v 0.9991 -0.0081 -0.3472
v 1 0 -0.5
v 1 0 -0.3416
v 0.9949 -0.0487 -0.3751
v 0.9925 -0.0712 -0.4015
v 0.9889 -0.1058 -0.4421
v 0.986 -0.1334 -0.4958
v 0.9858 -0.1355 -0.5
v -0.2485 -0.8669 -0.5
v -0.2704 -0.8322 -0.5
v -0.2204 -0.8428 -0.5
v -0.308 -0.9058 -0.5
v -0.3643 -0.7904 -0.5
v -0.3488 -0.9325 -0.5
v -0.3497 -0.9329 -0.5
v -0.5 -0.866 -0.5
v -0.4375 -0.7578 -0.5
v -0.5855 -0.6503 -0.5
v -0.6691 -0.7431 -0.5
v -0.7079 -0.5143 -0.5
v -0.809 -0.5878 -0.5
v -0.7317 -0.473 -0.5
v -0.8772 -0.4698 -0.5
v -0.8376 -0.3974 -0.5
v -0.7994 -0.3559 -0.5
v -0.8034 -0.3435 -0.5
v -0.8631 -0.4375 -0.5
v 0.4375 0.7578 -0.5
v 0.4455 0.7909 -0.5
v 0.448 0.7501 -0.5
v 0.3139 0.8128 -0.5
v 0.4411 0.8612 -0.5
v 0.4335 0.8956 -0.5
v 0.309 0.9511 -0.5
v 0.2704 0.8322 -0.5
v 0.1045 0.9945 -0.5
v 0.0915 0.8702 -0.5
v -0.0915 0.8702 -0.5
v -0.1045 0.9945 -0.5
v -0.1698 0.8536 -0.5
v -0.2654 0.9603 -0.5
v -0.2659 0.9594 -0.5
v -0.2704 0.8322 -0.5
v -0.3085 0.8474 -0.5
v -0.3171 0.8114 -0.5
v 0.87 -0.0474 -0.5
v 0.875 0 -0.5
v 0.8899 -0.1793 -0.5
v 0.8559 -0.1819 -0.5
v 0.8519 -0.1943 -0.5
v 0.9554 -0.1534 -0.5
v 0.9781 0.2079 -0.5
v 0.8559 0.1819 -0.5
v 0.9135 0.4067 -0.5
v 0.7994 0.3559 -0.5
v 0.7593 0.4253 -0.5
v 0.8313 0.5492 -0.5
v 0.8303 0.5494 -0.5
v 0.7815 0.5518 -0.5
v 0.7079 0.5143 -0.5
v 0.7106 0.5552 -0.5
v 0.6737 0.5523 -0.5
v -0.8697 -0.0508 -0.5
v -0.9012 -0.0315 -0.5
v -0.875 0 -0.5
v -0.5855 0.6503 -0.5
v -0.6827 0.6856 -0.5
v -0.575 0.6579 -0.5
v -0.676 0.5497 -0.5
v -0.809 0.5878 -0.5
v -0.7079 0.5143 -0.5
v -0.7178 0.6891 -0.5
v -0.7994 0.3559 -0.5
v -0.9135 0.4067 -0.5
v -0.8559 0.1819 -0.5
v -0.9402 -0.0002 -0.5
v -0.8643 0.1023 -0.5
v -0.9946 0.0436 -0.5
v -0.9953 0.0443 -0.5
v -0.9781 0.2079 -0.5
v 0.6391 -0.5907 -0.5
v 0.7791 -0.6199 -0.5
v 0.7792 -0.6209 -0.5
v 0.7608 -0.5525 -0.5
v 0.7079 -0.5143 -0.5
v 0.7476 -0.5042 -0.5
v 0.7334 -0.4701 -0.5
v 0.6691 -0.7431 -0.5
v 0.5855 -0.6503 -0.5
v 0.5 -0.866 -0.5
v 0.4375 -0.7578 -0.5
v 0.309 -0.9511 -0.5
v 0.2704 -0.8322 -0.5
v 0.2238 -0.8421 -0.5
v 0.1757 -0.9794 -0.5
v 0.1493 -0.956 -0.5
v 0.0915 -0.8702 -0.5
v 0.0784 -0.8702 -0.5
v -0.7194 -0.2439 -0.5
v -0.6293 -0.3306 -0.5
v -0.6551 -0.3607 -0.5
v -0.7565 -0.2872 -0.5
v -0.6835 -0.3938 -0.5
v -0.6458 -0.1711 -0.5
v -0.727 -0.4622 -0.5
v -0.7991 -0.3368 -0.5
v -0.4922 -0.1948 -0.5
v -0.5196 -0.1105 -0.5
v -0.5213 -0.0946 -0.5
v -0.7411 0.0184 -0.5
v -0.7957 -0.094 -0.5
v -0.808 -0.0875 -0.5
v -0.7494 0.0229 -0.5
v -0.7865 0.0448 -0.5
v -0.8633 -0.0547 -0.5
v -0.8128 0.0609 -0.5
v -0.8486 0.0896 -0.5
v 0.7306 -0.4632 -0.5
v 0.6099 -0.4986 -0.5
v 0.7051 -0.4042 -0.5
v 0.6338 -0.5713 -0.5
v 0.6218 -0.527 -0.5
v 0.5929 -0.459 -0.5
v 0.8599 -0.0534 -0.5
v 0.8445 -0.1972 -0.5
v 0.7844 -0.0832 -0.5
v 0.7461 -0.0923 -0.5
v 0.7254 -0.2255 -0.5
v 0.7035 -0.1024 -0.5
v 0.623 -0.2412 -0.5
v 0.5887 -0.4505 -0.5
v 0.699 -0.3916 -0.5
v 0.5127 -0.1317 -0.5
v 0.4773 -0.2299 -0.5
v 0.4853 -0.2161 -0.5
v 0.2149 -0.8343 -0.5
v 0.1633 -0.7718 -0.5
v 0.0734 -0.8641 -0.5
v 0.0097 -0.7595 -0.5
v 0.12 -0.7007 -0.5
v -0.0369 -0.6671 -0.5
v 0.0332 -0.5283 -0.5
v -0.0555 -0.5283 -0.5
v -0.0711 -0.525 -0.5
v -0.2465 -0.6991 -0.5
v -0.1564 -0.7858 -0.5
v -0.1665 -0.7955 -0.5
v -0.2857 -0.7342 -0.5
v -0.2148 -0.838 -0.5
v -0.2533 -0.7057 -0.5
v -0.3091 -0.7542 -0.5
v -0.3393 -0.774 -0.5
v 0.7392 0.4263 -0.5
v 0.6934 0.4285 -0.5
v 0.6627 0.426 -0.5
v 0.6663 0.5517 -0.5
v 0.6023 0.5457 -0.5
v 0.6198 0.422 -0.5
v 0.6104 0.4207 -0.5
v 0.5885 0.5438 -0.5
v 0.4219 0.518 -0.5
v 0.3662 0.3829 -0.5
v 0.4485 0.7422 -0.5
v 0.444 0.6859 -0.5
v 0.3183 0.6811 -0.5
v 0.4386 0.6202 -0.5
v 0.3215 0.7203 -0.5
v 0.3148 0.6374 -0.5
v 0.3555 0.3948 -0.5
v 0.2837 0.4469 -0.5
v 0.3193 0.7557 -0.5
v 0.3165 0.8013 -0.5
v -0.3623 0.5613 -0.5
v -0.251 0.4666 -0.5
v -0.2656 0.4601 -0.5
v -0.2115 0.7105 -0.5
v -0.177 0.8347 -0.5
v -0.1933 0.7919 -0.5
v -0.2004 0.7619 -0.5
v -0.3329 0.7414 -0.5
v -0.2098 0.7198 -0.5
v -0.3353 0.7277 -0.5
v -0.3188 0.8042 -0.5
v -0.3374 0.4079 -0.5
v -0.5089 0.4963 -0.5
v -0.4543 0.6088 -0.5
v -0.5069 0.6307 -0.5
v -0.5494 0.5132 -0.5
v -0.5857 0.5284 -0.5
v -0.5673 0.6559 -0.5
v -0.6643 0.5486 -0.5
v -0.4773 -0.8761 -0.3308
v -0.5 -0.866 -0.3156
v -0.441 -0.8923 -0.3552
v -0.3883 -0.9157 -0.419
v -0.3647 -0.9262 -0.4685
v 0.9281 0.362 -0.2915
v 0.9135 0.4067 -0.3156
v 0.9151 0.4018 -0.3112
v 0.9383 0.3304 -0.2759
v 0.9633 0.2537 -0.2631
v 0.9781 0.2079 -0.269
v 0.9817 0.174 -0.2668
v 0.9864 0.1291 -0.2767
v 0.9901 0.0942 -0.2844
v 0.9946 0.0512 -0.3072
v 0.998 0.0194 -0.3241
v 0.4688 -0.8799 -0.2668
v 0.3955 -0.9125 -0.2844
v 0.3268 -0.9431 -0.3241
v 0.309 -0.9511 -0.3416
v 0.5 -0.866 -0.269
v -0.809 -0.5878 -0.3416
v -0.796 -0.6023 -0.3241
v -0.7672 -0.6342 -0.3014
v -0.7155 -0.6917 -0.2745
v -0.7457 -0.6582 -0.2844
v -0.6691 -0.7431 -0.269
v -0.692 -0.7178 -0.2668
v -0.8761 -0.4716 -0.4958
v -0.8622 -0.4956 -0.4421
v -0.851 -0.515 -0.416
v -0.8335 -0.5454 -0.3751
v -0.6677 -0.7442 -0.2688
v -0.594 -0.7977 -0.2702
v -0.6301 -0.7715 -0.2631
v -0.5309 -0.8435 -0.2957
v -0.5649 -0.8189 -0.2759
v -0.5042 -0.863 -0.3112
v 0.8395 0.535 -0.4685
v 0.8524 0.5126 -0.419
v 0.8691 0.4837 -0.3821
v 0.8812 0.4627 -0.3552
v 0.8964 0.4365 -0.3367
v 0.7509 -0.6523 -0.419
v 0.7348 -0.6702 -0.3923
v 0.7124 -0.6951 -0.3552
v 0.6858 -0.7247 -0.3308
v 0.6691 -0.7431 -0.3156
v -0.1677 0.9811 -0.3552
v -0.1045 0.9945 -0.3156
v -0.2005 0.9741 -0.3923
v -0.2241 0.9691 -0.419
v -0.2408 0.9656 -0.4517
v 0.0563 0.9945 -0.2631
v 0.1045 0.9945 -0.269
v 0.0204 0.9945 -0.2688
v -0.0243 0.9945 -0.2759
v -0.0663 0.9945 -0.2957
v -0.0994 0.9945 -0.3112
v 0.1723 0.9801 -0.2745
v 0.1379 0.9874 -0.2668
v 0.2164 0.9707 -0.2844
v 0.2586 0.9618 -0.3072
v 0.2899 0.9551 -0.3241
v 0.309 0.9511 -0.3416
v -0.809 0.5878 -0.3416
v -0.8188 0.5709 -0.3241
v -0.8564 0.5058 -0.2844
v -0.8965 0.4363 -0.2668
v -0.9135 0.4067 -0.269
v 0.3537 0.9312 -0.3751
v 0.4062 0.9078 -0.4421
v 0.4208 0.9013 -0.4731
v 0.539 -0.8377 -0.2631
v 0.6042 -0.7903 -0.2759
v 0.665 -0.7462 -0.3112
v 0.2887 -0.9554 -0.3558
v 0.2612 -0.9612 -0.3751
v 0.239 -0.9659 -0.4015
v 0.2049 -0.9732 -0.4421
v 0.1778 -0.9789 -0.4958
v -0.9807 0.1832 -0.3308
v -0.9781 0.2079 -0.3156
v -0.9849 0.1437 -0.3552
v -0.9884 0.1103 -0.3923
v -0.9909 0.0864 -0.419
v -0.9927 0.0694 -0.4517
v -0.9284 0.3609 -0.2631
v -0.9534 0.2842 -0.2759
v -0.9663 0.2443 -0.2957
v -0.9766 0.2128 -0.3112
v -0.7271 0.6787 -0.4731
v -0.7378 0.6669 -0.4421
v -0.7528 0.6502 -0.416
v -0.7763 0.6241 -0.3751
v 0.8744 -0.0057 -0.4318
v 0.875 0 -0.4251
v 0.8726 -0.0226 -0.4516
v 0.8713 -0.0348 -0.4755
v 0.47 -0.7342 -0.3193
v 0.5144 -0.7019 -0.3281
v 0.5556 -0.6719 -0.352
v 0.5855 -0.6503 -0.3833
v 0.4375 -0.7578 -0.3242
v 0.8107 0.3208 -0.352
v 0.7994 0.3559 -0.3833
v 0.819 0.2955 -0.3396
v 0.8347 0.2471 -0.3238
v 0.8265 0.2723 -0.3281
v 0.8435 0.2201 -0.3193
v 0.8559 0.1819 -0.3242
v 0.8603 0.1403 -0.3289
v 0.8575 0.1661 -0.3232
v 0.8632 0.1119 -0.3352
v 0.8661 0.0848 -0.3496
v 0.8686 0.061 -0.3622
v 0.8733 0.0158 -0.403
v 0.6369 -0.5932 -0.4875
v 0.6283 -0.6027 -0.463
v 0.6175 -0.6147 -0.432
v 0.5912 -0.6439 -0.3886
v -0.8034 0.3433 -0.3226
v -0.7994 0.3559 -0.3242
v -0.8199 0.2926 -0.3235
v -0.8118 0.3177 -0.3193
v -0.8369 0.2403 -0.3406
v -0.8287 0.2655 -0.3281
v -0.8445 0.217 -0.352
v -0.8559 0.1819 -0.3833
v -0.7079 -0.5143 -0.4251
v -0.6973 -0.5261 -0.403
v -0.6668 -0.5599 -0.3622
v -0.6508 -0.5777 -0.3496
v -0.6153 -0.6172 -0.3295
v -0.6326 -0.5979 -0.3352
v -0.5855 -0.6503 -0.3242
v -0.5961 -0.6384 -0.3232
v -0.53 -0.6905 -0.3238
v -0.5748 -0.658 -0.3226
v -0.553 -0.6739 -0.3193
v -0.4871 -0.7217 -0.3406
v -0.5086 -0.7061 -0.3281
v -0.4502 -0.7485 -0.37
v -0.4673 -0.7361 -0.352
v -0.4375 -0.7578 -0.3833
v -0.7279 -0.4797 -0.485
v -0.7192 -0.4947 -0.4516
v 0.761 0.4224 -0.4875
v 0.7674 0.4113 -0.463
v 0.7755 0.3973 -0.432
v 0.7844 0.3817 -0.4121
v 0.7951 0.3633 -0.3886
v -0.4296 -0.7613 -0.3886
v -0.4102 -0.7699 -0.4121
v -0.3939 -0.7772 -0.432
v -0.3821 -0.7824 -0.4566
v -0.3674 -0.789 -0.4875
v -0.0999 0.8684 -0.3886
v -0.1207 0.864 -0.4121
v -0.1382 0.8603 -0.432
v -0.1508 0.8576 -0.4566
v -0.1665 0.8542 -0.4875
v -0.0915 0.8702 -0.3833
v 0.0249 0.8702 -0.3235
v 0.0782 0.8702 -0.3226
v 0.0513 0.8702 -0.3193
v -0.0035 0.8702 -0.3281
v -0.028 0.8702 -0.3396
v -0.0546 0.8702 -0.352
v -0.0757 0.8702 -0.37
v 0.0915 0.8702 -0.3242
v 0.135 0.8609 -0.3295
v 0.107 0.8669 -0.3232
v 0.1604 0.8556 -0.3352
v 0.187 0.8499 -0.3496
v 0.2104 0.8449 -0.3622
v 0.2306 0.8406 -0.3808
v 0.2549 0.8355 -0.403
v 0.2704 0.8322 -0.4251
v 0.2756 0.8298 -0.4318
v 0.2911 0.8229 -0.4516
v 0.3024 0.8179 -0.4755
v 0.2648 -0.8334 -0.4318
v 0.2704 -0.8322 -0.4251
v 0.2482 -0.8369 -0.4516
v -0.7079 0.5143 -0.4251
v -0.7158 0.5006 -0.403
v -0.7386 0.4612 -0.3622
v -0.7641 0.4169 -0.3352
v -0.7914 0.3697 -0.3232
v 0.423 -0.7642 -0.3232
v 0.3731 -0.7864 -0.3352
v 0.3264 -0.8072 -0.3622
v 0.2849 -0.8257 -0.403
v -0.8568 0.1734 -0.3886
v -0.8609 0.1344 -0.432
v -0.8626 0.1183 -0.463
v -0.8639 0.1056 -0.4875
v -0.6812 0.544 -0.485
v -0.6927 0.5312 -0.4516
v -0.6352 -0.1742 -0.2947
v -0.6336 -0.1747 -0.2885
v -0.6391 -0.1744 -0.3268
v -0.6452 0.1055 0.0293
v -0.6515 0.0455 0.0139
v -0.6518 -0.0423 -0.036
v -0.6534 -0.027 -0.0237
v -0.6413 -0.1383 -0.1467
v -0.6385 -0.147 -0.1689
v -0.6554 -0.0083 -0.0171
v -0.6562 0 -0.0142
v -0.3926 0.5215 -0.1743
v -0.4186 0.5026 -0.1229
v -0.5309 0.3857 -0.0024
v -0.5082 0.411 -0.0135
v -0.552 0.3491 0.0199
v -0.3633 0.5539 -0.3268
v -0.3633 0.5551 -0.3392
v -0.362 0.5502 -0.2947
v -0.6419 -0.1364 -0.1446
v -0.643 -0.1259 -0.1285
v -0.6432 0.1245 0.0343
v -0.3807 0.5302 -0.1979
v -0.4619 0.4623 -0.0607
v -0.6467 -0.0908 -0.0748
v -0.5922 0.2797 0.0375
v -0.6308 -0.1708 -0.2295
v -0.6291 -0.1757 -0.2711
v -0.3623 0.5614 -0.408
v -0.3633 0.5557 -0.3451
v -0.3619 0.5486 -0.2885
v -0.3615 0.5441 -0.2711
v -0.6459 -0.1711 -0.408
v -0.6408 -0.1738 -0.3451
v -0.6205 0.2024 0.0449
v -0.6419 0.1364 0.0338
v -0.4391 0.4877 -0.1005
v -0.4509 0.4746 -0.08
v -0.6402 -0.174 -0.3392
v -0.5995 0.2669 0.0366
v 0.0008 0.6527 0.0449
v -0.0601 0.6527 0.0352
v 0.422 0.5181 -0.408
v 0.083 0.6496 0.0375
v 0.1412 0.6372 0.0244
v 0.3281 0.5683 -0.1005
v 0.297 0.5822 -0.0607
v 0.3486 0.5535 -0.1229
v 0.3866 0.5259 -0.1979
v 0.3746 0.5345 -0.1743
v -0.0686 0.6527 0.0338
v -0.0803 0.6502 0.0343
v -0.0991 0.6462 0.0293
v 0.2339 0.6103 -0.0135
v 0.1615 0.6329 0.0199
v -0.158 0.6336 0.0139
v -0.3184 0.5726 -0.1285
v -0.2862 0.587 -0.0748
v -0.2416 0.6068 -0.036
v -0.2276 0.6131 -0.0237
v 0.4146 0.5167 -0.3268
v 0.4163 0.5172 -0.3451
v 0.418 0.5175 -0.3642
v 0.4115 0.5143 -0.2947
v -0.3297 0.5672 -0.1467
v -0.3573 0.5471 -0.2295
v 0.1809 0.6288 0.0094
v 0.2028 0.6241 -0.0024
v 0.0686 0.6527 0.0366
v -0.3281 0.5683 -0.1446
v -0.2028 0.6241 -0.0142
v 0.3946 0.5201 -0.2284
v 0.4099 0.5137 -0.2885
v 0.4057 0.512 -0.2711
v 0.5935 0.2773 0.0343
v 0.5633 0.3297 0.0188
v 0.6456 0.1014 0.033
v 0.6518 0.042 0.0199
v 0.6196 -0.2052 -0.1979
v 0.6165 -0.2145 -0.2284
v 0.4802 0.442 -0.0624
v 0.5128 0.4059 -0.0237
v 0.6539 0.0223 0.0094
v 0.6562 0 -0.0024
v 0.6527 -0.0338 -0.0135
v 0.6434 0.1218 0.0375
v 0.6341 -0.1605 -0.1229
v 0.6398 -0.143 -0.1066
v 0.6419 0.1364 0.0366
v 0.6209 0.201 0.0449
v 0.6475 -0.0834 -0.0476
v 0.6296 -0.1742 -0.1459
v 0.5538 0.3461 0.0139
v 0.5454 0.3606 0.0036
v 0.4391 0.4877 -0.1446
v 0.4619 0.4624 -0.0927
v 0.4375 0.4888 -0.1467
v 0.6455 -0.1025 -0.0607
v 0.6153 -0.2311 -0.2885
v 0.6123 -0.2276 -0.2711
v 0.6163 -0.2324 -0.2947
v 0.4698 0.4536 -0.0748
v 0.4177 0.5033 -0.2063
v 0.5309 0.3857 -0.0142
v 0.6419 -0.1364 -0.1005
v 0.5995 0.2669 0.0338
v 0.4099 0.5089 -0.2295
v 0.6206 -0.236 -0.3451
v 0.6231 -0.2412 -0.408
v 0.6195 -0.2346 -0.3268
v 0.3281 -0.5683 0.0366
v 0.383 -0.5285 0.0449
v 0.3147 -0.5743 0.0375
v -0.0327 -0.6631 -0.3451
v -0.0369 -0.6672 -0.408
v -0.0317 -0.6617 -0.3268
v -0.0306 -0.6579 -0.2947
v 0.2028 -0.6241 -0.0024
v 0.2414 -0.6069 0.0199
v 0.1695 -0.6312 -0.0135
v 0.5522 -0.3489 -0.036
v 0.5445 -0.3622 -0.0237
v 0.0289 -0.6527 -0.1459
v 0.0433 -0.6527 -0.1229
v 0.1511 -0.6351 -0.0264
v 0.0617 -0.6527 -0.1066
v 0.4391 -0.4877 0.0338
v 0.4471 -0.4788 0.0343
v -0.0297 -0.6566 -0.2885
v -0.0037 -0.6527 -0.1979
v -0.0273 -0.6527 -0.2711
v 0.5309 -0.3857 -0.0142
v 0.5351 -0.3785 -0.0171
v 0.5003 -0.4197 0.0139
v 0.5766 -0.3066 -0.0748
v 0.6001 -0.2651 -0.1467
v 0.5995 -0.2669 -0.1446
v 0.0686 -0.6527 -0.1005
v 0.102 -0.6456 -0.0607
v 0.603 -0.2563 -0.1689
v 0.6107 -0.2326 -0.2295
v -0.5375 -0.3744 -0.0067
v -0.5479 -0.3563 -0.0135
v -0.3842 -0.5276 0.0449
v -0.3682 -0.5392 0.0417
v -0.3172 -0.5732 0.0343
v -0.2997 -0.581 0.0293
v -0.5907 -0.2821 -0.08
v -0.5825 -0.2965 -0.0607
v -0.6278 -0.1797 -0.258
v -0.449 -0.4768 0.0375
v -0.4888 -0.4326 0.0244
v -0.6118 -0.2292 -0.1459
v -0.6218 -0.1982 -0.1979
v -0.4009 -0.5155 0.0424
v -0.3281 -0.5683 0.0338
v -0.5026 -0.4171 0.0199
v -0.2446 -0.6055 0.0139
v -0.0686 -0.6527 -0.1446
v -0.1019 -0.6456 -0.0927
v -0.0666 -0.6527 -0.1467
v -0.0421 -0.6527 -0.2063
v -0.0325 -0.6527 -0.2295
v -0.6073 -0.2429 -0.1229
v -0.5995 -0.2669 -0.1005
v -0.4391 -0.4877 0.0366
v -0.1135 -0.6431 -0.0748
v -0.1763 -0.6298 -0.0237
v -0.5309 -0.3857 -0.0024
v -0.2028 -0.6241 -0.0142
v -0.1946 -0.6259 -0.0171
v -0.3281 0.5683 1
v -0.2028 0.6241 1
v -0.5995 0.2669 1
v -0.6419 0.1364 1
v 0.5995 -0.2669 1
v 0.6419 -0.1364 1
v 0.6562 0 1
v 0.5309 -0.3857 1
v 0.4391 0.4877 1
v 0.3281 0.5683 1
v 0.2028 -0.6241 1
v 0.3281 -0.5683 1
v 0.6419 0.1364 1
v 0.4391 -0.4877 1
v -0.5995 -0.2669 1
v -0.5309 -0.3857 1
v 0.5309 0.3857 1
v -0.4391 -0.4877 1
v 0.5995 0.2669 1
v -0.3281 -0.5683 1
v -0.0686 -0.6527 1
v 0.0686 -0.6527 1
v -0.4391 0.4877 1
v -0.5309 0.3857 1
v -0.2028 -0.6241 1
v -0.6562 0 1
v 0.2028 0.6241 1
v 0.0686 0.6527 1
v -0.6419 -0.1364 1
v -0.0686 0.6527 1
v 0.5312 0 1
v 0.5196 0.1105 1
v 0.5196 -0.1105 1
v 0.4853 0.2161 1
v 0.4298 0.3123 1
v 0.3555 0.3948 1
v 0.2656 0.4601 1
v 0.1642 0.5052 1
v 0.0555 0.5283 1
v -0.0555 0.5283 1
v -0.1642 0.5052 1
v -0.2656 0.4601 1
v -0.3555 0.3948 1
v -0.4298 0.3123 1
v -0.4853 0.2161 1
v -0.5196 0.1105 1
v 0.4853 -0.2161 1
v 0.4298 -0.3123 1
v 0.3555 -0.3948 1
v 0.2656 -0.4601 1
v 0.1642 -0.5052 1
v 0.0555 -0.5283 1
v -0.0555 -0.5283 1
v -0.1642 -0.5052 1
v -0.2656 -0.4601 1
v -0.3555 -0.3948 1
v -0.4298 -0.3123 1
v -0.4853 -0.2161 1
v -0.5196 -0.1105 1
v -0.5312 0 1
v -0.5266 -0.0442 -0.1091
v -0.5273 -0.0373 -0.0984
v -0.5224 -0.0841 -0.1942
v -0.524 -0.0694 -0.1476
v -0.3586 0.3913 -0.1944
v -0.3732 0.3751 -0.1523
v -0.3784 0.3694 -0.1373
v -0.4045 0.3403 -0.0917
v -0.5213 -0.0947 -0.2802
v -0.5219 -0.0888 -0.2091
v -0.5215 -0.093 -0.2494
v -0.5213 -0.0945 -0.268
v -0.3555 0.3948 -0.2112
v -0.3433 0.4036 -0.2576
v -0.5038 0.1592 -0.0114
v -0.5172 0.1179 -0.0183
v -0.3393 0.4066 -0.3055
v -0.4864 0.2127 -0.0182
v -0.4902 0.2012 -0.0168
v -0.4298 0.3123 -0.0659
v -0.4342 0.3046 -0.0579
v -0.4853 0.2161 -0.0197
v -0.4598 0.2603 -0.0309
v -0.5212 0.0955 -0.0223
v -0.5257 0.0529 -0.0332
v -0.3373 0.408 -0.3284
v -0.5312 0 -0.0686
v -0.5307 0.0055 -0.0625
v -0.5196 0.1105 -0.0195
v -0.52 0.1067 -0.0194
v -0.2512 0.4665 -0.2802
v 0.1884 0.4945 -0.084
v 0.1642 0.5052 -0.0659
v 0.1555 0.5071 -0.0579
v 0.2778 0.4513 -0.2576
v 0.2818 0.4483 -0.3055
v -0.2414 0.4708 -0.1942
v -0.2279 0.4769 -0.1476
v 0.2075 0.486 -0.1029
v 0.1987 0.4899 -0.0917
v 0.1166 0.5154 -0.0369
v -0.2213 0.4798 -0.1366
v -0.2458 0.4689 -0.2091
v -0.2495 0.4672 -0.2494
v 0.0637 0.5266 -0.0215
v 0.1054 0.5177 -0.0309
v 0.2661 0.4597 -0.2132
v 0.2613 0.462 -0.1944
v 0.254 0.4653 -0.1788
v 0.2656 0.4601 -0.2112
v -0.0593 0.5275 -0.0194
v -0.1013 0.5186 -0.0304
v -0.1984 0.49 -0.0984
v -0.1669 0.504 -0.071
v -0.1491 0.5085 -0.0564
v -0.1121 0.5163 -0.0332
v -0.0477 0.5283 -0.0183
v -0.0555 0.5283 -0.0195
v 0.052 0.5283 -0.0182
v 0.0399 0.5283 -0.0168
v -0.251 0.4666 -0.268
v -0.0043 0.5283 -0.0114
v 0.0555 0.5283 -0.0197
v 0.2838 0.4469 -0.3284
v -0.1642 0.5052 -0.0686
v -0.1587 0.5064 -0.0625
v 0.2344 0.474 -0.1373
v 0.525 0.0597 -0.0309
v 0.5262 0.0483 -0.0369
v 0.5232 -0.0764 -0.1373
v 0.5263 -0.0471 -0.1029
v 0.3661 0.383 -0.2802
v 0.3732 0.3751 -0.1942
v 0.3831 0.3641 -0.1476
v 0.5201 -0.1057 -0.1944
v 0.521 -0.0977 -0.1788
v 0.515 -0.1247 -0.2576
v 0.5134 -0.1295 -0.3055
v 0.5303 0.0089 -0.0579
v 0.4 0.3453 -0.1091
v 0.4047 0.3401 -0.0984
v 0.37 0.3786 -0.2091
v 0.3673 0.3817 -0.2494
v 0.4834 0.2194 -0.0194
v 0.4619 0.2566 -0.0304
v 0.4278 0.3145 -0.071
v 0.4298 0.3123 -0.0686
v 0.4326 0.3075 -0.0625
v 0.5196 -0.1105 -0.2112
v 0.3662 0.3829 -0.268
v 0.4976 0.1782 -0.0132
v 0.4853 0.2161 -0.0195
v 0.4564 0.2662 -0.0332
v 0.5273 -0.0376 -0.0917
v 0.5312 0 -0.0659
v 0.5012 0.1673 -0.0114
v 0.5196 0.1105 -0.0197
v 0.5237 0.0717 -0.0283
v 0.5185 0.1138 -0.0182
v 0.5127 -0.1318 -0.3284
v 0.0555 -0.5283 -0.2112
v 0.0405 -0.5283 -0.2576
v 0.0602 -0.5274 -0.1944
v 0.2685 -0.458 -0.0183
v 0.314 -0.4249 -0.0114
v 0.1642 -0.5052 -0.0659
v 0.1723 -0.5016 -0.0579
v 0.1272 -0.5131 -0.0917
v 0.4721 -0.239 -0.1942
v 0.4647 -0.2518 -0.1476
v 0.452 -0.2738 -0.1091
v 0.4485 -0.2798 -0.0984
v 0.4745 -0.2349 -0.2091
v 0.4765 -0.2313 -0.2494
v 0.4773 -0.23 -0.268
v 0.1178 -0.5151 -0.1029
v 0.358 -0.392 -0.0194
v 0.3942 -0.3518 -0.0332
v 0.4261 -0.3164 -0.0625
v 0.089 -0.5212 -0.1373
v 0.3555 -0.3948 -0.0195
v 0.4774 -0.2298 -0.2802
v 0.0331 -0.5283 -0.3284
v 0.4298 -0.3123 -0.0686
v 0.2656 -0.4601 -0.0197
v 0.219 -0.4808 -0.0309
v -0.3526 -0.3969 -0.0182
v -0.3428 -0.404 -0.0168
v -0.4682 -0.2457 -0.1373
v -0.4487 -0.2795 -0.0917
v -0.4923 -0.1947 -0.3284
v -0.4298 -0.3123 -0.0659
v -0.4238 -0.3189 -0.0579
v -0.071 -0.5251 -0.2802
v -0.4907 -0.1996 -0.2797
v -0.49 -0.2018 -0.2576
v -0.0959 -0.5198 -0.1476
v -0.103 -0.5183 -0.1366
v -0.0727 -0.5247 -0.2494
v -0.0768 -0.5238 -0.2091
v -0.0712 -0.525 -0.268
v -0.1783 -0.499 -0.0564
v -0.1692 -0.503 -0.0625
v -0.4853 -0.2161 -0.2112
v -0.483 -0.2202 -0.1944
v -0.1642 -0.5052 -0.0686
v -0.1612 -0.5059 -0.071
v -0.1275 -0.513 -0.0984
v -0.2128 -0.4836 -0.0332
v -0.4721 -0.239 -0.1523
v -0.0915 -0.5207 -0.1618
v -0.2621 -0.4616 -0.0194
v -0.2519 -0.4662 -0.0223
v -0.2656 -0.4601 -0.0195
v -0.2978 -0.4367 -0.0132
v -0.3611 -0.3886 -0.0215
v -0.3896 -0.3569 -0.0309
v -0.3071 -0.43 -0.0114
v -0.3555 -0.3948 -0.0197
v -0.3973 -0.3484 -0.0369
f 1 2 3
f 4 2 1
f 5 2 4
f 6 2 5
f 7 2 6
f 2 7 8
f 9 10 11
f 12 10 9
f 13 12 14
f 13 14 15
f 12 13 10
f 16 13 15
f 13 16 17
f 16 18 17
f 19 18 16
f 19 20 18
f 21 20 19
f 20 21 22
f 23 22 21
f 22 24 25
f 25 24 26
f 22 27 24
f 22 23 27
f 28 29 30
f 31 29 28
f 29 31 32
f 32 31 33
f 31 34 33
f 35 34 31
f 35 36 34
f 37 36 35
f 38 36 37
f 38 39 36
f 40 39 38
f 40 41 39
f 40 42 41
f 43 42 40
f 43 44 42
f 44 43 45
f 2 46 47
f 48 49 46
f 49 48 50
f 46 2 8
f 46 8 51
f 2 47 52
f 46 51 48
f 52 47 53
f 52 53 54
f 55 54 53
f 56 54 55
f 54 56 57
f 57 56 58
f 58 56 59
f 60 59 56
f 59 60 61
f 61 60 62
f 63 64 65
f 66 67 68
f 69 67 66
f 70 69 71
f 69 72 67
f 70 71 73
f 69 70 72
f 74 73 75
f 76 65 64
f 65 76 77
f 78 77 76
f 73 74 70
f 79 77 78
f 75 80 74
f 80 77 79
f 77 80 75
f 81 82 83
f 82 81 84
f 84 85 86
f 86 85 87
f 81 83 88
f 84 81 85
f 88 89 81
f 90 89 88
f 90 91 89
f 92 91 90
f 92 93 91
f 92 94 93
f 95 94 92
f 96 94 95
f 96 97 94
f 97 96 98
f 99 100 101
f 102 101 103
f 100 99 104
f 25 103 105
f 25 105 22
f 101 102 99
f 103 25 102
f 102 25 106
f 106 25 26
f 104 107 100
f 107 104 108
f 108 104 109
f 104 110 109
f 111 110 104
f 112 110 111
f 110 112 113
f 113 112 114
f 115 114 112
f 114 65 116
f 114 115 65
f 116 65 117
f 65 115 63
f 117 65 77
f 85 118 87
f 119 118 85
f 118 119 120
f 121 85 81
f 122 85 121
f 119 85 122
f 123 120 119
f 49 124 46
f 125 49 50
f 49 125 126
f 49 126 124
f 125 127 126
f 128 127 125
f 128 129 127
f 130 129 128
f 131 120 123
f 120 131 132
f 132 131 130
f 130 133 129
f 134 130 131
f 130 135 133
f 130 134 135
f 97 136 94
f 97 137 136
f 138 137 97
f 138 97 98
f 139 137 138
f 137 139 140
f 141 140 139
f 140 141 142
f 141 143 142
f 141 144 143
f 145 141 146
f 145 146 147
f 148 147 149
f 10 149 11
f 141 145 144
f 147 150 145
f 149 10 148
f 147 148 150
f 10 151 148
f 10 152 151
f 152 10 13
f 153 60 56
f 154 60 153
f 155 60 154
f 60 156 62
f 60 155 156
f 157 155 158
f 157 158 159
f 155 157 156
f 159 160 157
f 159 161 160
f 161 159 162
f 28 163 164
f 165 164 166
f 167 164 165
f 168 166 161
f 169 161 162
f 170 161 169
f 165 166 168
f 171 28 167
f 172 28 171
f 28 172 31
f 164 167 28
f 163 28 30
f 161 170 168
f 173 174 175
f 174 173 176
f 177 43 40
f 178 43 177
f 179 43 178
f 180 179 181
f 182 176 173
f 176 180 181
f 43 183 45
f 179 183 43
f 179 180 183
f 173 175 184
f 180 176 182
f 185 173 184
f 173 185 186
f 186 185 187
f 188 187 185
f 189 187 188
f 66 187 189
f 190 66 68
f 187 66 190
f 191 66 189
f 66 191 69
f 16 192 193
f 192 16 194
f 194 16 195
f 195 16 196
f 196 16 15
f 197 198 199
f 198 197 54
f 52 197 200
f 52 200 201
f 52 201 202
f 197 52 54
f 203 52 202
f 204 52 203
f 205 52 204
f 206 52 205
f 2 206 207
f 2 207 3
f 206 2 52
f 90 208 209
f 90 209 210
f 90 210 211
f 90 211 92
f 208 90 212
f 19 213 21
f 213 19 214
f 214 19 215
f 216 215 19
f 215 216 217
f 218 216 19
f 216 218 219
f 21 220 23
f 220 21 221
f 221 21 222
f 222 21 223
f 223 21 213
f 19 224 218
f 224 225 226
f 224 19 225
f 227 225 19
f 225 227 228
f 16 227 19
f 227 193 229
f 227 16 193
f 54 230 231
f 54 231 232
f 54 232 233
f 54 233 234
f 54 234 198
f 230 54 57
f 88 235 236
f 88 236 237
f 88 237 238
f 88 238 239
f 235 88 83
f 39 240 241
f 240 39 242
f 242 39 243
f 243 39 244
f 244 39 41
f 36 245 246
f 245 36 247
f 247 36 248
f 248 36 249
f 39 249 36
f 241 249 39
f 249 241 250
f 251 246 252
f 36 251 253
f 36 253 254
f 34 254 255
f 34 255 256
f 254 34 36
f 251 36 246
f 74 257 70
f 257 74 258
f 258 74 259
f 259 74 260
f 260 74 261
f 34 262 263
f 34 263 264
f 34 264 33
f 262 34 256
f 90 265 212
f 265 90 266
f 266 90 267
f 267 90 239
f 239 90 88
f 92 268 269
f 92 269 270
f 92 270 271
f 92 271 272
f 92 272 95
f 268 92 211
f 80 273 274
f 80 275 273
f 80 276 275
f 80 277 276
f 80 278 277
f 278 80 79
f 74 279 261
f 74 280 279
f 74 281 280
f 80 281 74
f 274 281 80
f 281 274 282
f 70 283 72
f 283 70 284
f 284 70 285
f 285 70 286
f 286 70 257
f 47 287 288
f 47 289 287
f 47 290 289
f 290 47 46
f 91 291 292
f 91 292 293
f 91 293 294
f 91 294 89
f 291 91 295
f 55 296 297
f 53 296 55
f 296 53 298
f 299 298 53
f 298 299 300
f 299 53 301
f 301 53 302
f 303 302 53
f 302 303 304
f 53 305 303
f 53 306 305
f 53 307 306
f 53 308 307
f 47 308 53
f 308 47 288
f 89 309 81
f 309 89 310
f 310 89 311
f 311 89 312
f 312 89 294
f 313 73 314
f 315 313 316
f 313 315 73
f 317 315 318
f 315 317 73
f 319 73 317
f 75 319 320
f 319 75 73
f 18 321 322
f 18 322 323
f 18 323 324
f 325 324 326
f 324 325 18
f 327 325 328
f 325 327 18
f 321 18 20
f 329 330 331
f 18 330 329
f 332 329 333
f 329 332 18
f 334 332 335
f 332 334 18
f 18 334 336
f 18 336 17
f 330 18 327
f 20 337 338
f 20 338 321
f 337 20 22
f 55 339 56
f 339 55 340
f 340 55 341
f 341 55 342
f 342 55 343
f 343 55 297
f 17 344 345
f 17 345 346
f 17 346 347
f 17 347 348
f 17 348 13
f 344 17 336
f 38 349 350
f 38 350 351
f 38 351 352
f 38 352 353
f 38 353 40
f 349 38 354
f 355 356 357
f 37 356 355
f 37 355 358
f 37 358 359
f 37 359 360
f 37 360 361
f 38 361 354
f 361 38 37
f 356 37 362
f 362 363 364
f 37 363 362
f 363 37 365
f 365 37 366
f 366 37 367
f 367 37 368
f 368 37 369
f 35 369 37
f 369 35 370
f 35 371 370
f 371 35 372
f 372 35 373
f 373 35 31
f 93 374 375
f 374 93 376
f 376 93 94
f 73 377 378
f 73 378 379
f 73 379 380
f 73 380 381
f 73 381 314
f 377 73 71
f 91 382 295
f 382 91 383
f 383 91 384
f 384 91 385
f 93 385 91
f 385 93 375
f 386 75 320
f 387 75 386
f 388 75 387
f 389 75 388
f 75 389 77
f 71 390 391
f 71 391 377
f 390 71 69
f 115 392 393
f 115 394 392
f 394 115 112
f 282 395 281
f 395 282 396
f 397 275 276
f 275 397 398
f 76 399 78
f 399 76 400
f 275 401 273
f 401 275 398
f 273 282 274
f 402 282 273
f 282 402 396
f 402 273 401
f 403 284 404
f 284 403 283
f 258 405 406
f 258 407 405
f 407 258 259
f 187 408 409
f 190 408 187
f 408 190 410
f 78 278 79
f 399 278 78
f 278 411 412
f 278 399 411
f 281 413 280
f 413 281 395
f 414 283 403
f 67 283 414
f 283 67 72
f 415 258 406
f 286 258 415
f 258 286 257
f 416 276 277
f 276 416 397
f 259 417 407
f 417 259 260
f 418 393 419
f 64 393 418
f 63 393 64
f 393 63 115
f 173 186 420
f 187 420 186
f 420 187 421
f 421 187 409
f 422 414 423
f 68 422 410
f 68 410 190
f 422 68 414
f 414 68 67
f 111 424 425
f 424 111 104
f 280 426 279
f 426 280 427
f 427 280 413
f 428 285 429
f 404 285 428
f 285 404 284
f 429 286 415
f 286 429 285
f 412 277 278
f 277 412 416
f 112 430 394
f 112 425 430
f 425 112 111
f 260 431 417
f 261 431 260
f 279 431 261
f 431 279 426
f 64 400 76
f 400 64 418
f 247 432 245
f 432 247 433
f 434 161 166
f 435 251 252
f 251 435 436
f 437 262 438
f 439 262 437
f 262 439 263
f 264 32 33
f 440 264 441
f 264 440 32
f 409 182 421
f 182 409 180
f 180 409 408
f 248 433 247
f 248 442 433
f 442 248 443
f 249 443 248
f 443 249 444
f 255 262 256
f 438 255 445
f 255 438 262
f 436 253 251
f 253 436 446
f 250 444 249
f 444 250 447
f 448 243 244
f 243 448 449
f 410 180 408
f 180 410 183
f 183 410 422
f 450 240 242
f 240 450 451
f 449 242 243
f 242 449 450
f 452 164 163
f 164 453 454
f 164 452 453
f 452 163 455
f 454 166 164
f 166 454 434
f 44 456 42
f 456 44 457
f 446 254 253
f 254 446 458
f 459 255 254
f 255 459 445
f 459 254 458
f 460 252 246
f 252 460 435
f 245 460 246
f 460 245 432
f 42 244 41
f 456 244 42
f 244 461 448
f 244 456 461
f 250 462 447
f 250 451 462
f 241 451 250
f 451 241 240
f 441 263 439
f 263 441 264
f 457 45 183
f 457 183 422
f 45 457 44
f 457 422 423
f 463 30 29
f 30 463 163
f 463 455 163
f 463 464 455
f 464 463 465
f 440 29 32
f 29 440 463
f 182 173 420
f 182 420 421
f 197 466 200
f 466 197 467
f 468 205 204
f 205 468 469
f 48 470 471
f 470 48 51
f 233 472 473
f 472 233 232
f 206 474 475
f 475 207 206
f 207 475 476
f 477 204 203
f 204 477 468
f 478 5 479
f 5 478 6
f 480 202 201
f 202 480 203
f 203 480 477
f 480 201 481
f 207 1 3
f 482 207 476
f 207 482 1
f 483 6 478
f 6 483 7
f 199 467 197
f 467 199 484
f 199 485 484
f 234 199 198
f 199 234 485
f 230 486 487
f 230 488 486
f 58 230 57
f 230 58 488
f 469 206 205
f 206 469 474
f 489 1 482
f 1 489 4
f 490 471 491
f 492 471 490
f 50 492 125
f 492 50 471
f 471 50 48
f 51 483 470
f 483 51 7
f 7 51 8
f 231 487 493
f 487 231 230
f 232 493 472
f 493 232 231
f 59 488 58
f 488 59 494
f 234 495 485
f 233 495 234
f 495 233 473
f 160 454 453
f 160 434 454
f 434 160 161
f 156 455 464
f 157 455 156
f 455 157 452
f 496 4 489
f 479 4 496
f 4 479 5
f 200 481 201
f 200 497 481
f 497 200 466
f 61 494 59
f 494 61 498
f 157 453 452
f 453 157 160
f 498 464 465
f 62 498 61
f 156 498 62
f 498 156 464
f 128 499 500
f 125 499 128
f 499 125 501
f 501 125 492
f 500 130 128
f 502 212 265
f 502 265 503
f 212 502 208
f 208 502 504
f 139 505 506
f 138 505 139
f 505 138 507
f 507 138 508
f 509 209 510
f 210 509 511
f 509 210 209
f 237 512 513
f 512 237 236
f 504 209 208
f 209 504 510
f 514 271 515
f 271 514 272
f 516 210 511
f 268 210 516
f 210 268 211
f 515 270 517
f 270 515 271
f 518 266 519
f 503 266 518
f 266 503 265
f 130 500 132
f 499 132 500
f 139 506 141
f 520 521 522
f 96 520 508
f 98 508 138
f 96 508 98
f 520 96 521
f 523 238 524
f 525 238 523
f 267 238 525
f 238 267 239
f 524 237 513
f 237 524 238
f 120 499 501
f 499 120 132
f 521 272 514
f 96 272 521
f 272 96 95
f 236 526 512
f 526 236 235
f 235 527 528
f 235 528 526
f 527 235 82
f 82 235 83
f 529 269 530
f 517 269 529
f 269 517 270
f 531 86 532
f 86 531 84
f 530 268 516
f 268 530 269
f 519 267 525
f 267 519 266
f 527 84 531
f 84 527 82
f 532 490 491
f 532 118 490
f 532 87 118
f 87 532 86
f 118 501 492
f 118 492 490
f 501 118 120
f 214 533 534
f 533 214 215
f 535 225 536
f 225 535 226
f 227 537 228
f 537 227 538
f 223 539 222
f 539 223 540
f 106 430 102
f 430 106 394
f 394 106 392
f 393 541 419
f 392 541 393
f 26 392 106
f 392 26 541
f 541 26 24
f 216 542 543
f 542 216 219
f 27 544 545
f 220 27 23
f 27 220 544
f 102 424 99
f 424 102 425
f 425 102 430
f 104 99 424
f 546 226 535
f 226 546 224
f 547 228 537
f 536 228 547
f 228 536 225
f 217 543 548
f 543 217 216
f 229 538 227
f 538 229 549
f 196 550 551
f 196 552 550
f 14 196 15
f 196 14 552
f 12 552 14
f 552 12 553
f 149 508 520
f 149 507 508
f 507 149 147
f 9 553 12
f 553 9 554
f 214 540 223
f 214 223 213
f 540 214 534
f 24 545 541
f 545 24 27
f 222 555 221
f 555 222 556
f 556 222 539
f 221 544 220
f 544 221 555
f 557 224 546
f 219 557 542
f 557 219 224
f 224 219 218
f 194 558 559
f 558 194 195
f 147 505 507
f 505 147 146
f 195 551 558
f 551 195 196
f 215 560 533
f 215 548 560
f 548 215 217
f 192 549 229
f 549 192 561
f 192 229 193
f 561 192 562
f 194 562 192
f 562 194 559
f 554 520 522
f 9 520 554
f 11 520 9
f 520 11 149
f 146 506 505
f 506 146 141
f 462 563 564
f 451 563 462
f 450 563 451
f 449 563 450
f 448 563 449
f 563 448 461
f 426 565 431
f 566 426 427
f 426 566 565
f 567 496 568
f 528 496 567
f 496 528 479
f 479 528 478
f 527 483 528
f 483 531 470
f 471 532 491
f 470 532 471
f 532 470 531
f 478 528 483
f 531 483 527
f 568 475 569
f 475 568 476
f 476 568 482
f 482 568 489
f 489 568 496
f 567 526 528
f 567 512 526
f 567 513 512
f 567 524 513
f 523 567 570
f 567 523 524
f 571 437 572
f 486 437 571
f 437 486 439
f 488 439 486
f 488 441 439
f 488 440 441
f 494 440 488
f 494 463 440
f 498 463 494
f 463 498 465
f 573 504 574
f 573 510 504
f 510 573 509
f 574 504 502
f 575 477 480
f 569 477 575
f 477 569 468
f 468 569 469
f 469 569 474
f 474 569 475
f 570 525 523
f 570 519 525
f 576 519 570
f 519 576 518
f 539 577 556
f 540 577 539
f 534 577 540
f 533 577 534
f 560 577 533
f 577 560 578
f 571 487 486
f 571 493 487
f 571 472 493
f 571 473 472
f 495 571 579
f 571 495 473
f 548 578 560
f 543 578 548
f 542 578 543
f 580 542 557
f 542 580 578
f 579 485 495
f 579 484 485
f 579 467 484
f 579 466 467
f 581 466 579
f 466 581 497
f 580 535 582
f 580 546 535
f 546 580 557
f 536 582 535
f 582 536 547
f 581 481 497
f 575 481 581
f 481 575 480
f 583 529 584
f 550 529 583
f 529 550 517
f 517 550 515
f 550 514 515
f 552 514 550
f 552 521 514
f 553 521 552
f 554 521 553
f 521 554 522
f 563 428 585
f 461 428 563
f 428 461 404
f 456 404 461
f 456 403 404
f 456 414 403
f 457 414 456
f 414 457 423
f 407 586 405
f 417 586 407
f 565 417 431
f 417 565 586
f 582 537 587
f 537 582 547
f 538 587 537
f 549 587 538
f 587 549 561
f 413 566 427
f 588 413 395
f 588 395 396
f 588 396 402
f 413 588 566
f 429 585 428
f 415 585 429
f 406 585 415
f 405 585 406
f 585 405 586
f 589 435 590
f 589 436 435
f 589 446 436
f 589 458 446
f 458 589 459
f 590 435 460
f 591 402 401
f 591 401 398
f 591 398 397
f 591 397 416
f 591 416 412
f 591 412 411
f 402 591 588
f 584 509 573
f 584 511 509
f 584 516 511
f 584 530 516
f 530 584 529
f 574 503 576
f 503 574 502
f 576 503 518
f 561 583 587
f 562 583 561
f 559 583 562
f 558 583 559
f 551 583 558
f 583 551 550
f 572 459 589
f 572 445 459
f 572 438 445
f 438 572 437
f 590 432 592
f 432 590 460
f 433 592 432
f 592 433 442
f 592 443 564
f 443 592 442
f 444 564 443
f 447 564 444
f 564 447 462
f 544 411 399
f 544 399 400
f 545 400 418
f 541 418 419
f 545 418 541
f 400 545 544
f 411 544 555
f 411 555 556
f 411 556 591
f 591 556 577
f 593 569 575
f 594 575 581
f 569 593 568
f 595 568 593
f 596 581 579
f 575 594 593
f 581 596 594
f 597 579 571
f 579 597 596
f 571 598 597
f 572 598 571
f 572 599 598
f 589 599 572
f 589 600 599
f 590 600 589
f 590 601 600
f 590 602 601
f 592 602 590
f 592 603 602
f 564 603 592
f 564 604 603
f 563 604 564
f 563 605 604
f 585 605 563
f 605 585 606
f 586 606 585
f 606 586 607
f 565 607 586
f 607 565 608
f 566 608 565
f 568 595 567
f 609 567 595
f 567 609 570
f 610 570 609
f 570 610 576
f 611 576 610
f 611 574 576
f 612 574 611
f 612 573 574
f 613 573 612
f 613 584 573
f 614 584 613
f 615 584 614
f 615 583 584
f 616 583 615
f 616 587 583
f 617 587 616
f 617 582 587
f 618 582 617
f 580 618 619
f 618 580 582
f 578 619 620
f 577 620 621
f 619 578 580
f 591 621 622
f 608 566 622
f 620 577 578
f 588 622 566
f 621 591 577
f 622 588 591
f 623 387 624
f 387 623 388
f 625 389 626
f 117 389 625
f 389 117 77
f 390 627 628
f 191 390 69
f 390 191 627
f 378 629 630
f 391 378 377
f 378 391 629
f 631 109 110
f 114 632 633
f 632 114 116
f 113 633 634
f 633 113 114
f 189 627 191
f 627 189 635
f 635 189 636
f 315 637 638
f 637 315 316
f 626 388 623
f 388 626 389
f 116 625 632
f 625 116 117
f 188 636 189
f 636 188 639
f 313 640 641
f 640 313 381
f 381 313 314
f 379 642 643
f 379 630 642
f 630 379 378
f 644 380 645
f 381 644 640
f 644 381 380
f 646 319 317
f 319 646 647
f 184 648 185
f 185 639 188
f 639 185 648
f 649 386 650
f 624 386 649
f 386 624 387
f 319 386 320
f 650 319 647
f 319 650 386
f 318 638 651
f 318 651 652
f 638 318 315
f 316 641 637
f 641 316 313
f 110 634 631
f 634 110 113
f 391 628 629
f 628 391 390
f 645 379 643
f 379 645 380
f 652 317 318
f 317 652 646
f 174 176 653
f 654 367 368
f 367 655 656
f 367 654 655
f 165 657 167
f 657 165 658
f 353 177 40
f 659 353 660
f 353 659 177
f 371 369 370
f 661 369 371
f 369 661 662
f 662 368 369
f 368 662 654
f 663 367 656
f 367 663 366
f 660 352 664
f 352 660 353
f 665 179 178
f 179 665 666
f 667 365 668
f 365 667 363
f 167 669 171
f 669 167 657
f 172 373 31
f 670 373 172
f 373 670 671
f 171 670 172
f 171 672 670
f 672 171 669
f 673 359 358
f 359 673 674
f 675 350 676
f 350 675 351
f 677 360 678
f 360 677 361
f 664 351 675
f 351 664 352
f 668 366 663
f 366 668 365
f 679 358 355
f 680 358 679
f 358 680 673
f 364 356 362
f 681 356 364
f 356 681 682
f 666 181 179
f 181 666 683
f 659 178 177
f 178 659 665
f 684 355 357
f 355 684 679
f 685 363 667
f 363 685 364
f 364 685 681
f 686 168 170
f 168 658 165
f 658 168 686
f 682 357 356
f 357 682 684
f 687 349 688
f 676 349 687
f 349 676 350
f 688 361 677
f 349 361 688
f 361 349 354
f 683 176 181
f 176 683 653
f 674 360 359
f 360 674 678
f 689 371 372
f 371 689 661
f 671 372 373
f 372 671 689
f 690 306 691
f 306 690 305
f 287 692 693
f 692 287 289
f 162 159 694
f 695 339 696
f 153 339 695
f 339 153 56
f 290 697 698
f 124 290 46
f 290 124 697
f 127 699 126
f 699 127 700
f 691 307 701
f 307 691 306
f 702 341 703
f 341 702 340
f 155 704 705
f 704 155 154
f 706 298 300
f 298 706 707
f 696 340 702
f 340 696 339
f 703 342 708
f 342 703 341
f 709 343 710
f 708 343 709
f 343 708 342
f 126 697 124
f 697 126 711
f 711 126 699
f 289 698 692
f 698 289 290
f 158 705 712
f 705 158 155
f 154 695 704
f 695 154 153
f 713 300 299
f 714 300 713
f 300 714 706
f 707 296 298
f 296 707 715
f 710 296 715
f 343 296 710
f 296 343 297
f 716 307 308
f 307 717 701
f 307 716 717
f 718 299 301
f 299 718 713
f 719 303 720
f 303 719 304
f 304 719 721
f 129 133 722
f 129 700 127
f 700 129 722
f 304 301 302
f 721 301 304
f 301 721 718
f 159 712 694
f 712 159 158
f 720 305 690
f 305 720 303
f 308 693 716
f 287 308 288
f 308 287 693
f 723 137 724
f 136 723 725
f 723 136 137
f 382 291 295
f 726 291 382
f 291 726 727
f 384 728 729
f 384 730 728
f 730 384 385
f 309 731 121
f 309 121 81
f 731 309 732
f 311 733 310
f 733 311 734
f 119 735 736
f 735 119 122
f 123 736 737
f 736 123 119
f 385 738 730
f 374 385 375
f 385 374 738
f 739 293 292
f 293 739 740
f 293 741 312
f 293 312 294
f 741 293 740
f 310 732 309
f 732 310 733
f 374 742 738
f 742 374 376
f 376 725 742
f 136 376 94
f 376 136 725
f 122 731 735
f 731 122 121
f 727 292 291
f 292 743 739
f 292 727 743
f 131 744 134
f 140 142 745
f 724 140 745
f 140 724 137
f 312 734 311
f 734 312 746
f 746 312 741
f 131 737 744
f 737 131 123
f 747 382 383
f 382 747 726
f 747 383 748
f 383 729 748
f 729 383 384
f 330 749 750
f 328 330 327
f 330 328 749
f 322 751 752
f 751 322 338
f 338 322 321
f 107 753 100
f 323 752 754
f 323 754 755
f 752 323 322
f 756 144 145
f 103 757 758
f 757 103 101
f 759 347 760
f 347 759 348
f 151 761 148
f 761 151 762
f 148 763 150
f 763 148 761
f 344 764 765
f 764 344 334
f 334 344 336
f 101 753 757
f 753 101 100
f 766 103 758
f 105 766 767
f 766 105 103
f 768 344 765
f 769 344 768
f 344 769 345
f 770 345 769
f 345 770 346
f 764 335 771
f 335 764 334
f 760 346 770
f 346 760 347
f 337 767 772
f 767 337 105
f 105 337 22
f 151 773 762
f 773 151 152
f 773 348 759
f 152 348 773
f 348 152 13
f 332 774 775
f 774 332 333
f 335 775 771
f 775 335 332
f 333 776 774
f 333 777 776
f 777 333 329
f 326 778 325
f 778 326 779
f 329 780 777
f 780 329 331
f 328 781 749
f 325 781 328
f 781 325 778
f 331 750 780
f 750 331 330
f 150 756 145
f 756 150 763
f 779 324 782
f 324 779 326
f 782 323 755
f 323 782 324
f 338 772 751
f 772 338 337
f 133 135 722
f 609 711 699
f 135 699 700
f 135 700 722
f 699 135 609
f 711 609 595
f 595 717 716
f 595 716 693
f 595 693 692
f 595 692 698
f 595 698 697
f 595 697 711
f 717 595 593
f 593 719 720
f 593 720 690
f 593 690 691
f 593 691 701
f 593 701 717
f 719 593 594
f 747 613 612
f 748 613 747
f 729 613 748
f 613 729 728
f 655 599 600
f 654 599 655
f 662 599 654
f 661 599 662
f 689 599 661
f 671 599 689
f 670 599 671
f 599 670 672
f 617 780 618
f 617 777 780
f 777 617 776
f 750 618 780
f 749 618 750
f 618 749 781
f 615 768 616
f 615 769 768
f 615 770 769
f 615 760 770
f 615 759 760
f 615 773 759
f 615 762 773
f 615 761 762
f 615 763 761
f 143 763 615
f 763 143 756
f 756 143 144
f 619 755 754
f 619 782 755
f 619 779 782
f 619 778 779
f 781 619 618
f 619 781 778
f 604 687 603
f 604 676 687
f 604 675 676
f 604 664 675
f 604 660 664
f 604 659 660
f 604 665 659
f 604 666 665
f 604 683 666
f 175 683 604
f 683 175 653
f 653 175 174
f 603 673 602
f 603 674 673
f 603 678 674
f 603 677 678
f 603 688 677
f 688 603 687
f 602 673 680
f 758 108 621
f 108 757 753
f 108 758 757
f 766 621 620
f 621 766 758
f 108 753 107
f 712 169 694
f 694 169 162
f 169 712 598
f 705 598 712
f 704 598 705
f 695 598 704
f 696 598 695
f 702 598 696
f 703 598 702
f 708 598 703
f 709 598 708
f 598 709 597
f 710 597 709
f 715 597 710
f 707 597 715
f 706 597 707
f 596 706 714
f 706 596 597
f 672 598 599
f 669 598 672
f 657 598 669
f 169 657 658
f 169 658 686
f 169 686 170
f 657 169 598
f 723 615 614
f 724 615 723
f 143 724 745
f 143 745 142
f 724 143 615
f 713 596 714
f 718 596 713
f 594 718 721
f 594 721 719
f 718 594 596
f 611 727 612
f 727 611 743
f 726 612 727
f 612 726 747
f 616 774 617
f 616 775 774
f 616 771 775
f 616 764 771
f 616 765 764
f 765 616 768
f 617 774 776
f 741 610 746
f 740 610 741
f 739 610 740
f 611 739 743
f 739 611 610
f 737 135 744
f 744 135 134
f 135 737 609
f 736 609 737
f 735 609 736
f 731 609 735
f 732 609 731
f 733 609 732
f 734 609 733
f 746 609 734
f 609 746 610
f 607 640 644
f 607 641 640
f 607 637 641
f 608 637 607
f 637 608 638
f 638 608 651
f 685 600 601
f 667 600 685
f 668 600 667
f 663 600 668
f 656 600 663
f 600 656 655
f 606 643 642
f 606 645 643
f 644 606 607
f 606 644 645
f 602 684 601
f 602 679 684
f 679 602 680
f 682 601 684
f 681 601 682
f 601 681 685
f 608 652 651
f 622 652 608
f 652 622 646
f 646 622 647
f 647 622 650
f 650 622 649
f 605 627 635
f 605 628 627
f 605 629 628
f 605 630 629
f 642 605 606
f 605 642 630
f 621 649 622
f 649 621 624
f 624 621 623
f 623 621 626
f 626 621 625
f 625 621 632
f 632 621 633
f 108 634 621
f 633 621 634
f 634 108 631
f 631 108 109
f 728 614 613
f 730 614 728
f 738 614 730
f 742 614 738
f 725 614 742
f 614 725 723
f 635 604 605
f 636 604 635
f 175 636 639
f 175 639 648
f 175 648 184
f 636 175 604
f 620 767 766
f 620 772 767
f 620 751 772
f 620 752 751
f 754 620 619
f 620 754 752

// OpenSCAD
/*
This part is to make a tapered funnel top for a bell siphon used in hydroponics/aquaponics.

According to http://affnan-aquaponics.blogspot.com the funnel siphon top helps the siphon
start at stop at different water flows better.

Inspiration came from the flower shaped spillway at Kechut Reservoir near Jermuk in Armenia.

I am thinking that the flower shape increases the weir surface which may help prevent
problems. That and it looks neat.

Parametric, you can set the number of 'petals' and size it to the pipe you are using for
a stand pipe. 

Open scad appears to be unitless, so pick a unit for the parameters and stick to it. Your
slicing may assume things are in mm, if so, scale by 2540 to get things in inches.

Created by Mike Creuzer - mike@creuzer.com on 2012-08-15
*/



// Cone parameters
petals = 5; // number of 'petals' in the cone
height = .5;
wallthickness = 1/8;
// Not sure if this helps yet. It needs testing to see if
// the spiral flow will help with siphon start & stops. Make + or - to
// control the direction of the spin.
spiralofsset = -wallthickness;  
maxwidth = 2;

// Standpipe connection
standpipe = 17/16; // 3/4 ID looks to be about 1 1/16 OD 
// How tall you want the neck to be. A taller neck will allow you to have enough
// overlap that you can tweak the water height.

depth = 1; connectionthickness = 1/8;

// General settings
smoothness = .01; // 2 is the default & is pretty fast, smaller is smoother down to .01



//Render the part
rotate([180,0,0]) // Flip this over for easier printing
{
	union()
	{
			intersection()
			{
				difference()
				{
					cylinder(h = height, r=.5*maxwidth, $fs = smoothness);
					cylinder(h = height, r=.5*maxwidth -wallthickness, $fs = smoothness);
				}
				flowershell(wallthickness);
			}
			difference()
			{
				flower();
				difference()
				{
						cylinder(h = height, r=maxwidth, $fs = smoothness);
						cylinder(h = height, r=.5*maxwidth, $fs = smoothness);
				}
			}
	}
}




module flower()
{
	difference()
	{
		union() 
		{
			flowershell(wallthickness);
			standconnector();
			translate([0,0,-depth]) standconnector();
		}
		union()
		{
			flowershell();
			translate([0,0,height]) cylinder(h=3*height, r=4*height);
			translate([0,0,-depth]) cylinder(h = depth + height, r=.5*standpipe, $fs = smoothness);
		}
	
	}
}




module flowershell(thickness = 0)
{
		for (i = [0 : petals] ) 
		{
			rotate([0, 0 , i*360/petals]) petal(thickness);
		}

}




module petal(wall = 0)
{
		translate([spiralofsset,0,0])
			hull()
			{
				cylinder(h = height, r1 = .25*standpipe+wall, r2 = .25*standpipe+wall, $fs = smoothness);
				rotate([20,-45,0]) cylinder(h = 3*height, r1 = .25*standpipe+wall, r2 = .25*standpipe+wall, $fs = smoothness);
			}
}



module standconnector()
{
		cylinder(h = depth, r=.5*standpipe + connectionthickness, $fs = smoothness);
}
